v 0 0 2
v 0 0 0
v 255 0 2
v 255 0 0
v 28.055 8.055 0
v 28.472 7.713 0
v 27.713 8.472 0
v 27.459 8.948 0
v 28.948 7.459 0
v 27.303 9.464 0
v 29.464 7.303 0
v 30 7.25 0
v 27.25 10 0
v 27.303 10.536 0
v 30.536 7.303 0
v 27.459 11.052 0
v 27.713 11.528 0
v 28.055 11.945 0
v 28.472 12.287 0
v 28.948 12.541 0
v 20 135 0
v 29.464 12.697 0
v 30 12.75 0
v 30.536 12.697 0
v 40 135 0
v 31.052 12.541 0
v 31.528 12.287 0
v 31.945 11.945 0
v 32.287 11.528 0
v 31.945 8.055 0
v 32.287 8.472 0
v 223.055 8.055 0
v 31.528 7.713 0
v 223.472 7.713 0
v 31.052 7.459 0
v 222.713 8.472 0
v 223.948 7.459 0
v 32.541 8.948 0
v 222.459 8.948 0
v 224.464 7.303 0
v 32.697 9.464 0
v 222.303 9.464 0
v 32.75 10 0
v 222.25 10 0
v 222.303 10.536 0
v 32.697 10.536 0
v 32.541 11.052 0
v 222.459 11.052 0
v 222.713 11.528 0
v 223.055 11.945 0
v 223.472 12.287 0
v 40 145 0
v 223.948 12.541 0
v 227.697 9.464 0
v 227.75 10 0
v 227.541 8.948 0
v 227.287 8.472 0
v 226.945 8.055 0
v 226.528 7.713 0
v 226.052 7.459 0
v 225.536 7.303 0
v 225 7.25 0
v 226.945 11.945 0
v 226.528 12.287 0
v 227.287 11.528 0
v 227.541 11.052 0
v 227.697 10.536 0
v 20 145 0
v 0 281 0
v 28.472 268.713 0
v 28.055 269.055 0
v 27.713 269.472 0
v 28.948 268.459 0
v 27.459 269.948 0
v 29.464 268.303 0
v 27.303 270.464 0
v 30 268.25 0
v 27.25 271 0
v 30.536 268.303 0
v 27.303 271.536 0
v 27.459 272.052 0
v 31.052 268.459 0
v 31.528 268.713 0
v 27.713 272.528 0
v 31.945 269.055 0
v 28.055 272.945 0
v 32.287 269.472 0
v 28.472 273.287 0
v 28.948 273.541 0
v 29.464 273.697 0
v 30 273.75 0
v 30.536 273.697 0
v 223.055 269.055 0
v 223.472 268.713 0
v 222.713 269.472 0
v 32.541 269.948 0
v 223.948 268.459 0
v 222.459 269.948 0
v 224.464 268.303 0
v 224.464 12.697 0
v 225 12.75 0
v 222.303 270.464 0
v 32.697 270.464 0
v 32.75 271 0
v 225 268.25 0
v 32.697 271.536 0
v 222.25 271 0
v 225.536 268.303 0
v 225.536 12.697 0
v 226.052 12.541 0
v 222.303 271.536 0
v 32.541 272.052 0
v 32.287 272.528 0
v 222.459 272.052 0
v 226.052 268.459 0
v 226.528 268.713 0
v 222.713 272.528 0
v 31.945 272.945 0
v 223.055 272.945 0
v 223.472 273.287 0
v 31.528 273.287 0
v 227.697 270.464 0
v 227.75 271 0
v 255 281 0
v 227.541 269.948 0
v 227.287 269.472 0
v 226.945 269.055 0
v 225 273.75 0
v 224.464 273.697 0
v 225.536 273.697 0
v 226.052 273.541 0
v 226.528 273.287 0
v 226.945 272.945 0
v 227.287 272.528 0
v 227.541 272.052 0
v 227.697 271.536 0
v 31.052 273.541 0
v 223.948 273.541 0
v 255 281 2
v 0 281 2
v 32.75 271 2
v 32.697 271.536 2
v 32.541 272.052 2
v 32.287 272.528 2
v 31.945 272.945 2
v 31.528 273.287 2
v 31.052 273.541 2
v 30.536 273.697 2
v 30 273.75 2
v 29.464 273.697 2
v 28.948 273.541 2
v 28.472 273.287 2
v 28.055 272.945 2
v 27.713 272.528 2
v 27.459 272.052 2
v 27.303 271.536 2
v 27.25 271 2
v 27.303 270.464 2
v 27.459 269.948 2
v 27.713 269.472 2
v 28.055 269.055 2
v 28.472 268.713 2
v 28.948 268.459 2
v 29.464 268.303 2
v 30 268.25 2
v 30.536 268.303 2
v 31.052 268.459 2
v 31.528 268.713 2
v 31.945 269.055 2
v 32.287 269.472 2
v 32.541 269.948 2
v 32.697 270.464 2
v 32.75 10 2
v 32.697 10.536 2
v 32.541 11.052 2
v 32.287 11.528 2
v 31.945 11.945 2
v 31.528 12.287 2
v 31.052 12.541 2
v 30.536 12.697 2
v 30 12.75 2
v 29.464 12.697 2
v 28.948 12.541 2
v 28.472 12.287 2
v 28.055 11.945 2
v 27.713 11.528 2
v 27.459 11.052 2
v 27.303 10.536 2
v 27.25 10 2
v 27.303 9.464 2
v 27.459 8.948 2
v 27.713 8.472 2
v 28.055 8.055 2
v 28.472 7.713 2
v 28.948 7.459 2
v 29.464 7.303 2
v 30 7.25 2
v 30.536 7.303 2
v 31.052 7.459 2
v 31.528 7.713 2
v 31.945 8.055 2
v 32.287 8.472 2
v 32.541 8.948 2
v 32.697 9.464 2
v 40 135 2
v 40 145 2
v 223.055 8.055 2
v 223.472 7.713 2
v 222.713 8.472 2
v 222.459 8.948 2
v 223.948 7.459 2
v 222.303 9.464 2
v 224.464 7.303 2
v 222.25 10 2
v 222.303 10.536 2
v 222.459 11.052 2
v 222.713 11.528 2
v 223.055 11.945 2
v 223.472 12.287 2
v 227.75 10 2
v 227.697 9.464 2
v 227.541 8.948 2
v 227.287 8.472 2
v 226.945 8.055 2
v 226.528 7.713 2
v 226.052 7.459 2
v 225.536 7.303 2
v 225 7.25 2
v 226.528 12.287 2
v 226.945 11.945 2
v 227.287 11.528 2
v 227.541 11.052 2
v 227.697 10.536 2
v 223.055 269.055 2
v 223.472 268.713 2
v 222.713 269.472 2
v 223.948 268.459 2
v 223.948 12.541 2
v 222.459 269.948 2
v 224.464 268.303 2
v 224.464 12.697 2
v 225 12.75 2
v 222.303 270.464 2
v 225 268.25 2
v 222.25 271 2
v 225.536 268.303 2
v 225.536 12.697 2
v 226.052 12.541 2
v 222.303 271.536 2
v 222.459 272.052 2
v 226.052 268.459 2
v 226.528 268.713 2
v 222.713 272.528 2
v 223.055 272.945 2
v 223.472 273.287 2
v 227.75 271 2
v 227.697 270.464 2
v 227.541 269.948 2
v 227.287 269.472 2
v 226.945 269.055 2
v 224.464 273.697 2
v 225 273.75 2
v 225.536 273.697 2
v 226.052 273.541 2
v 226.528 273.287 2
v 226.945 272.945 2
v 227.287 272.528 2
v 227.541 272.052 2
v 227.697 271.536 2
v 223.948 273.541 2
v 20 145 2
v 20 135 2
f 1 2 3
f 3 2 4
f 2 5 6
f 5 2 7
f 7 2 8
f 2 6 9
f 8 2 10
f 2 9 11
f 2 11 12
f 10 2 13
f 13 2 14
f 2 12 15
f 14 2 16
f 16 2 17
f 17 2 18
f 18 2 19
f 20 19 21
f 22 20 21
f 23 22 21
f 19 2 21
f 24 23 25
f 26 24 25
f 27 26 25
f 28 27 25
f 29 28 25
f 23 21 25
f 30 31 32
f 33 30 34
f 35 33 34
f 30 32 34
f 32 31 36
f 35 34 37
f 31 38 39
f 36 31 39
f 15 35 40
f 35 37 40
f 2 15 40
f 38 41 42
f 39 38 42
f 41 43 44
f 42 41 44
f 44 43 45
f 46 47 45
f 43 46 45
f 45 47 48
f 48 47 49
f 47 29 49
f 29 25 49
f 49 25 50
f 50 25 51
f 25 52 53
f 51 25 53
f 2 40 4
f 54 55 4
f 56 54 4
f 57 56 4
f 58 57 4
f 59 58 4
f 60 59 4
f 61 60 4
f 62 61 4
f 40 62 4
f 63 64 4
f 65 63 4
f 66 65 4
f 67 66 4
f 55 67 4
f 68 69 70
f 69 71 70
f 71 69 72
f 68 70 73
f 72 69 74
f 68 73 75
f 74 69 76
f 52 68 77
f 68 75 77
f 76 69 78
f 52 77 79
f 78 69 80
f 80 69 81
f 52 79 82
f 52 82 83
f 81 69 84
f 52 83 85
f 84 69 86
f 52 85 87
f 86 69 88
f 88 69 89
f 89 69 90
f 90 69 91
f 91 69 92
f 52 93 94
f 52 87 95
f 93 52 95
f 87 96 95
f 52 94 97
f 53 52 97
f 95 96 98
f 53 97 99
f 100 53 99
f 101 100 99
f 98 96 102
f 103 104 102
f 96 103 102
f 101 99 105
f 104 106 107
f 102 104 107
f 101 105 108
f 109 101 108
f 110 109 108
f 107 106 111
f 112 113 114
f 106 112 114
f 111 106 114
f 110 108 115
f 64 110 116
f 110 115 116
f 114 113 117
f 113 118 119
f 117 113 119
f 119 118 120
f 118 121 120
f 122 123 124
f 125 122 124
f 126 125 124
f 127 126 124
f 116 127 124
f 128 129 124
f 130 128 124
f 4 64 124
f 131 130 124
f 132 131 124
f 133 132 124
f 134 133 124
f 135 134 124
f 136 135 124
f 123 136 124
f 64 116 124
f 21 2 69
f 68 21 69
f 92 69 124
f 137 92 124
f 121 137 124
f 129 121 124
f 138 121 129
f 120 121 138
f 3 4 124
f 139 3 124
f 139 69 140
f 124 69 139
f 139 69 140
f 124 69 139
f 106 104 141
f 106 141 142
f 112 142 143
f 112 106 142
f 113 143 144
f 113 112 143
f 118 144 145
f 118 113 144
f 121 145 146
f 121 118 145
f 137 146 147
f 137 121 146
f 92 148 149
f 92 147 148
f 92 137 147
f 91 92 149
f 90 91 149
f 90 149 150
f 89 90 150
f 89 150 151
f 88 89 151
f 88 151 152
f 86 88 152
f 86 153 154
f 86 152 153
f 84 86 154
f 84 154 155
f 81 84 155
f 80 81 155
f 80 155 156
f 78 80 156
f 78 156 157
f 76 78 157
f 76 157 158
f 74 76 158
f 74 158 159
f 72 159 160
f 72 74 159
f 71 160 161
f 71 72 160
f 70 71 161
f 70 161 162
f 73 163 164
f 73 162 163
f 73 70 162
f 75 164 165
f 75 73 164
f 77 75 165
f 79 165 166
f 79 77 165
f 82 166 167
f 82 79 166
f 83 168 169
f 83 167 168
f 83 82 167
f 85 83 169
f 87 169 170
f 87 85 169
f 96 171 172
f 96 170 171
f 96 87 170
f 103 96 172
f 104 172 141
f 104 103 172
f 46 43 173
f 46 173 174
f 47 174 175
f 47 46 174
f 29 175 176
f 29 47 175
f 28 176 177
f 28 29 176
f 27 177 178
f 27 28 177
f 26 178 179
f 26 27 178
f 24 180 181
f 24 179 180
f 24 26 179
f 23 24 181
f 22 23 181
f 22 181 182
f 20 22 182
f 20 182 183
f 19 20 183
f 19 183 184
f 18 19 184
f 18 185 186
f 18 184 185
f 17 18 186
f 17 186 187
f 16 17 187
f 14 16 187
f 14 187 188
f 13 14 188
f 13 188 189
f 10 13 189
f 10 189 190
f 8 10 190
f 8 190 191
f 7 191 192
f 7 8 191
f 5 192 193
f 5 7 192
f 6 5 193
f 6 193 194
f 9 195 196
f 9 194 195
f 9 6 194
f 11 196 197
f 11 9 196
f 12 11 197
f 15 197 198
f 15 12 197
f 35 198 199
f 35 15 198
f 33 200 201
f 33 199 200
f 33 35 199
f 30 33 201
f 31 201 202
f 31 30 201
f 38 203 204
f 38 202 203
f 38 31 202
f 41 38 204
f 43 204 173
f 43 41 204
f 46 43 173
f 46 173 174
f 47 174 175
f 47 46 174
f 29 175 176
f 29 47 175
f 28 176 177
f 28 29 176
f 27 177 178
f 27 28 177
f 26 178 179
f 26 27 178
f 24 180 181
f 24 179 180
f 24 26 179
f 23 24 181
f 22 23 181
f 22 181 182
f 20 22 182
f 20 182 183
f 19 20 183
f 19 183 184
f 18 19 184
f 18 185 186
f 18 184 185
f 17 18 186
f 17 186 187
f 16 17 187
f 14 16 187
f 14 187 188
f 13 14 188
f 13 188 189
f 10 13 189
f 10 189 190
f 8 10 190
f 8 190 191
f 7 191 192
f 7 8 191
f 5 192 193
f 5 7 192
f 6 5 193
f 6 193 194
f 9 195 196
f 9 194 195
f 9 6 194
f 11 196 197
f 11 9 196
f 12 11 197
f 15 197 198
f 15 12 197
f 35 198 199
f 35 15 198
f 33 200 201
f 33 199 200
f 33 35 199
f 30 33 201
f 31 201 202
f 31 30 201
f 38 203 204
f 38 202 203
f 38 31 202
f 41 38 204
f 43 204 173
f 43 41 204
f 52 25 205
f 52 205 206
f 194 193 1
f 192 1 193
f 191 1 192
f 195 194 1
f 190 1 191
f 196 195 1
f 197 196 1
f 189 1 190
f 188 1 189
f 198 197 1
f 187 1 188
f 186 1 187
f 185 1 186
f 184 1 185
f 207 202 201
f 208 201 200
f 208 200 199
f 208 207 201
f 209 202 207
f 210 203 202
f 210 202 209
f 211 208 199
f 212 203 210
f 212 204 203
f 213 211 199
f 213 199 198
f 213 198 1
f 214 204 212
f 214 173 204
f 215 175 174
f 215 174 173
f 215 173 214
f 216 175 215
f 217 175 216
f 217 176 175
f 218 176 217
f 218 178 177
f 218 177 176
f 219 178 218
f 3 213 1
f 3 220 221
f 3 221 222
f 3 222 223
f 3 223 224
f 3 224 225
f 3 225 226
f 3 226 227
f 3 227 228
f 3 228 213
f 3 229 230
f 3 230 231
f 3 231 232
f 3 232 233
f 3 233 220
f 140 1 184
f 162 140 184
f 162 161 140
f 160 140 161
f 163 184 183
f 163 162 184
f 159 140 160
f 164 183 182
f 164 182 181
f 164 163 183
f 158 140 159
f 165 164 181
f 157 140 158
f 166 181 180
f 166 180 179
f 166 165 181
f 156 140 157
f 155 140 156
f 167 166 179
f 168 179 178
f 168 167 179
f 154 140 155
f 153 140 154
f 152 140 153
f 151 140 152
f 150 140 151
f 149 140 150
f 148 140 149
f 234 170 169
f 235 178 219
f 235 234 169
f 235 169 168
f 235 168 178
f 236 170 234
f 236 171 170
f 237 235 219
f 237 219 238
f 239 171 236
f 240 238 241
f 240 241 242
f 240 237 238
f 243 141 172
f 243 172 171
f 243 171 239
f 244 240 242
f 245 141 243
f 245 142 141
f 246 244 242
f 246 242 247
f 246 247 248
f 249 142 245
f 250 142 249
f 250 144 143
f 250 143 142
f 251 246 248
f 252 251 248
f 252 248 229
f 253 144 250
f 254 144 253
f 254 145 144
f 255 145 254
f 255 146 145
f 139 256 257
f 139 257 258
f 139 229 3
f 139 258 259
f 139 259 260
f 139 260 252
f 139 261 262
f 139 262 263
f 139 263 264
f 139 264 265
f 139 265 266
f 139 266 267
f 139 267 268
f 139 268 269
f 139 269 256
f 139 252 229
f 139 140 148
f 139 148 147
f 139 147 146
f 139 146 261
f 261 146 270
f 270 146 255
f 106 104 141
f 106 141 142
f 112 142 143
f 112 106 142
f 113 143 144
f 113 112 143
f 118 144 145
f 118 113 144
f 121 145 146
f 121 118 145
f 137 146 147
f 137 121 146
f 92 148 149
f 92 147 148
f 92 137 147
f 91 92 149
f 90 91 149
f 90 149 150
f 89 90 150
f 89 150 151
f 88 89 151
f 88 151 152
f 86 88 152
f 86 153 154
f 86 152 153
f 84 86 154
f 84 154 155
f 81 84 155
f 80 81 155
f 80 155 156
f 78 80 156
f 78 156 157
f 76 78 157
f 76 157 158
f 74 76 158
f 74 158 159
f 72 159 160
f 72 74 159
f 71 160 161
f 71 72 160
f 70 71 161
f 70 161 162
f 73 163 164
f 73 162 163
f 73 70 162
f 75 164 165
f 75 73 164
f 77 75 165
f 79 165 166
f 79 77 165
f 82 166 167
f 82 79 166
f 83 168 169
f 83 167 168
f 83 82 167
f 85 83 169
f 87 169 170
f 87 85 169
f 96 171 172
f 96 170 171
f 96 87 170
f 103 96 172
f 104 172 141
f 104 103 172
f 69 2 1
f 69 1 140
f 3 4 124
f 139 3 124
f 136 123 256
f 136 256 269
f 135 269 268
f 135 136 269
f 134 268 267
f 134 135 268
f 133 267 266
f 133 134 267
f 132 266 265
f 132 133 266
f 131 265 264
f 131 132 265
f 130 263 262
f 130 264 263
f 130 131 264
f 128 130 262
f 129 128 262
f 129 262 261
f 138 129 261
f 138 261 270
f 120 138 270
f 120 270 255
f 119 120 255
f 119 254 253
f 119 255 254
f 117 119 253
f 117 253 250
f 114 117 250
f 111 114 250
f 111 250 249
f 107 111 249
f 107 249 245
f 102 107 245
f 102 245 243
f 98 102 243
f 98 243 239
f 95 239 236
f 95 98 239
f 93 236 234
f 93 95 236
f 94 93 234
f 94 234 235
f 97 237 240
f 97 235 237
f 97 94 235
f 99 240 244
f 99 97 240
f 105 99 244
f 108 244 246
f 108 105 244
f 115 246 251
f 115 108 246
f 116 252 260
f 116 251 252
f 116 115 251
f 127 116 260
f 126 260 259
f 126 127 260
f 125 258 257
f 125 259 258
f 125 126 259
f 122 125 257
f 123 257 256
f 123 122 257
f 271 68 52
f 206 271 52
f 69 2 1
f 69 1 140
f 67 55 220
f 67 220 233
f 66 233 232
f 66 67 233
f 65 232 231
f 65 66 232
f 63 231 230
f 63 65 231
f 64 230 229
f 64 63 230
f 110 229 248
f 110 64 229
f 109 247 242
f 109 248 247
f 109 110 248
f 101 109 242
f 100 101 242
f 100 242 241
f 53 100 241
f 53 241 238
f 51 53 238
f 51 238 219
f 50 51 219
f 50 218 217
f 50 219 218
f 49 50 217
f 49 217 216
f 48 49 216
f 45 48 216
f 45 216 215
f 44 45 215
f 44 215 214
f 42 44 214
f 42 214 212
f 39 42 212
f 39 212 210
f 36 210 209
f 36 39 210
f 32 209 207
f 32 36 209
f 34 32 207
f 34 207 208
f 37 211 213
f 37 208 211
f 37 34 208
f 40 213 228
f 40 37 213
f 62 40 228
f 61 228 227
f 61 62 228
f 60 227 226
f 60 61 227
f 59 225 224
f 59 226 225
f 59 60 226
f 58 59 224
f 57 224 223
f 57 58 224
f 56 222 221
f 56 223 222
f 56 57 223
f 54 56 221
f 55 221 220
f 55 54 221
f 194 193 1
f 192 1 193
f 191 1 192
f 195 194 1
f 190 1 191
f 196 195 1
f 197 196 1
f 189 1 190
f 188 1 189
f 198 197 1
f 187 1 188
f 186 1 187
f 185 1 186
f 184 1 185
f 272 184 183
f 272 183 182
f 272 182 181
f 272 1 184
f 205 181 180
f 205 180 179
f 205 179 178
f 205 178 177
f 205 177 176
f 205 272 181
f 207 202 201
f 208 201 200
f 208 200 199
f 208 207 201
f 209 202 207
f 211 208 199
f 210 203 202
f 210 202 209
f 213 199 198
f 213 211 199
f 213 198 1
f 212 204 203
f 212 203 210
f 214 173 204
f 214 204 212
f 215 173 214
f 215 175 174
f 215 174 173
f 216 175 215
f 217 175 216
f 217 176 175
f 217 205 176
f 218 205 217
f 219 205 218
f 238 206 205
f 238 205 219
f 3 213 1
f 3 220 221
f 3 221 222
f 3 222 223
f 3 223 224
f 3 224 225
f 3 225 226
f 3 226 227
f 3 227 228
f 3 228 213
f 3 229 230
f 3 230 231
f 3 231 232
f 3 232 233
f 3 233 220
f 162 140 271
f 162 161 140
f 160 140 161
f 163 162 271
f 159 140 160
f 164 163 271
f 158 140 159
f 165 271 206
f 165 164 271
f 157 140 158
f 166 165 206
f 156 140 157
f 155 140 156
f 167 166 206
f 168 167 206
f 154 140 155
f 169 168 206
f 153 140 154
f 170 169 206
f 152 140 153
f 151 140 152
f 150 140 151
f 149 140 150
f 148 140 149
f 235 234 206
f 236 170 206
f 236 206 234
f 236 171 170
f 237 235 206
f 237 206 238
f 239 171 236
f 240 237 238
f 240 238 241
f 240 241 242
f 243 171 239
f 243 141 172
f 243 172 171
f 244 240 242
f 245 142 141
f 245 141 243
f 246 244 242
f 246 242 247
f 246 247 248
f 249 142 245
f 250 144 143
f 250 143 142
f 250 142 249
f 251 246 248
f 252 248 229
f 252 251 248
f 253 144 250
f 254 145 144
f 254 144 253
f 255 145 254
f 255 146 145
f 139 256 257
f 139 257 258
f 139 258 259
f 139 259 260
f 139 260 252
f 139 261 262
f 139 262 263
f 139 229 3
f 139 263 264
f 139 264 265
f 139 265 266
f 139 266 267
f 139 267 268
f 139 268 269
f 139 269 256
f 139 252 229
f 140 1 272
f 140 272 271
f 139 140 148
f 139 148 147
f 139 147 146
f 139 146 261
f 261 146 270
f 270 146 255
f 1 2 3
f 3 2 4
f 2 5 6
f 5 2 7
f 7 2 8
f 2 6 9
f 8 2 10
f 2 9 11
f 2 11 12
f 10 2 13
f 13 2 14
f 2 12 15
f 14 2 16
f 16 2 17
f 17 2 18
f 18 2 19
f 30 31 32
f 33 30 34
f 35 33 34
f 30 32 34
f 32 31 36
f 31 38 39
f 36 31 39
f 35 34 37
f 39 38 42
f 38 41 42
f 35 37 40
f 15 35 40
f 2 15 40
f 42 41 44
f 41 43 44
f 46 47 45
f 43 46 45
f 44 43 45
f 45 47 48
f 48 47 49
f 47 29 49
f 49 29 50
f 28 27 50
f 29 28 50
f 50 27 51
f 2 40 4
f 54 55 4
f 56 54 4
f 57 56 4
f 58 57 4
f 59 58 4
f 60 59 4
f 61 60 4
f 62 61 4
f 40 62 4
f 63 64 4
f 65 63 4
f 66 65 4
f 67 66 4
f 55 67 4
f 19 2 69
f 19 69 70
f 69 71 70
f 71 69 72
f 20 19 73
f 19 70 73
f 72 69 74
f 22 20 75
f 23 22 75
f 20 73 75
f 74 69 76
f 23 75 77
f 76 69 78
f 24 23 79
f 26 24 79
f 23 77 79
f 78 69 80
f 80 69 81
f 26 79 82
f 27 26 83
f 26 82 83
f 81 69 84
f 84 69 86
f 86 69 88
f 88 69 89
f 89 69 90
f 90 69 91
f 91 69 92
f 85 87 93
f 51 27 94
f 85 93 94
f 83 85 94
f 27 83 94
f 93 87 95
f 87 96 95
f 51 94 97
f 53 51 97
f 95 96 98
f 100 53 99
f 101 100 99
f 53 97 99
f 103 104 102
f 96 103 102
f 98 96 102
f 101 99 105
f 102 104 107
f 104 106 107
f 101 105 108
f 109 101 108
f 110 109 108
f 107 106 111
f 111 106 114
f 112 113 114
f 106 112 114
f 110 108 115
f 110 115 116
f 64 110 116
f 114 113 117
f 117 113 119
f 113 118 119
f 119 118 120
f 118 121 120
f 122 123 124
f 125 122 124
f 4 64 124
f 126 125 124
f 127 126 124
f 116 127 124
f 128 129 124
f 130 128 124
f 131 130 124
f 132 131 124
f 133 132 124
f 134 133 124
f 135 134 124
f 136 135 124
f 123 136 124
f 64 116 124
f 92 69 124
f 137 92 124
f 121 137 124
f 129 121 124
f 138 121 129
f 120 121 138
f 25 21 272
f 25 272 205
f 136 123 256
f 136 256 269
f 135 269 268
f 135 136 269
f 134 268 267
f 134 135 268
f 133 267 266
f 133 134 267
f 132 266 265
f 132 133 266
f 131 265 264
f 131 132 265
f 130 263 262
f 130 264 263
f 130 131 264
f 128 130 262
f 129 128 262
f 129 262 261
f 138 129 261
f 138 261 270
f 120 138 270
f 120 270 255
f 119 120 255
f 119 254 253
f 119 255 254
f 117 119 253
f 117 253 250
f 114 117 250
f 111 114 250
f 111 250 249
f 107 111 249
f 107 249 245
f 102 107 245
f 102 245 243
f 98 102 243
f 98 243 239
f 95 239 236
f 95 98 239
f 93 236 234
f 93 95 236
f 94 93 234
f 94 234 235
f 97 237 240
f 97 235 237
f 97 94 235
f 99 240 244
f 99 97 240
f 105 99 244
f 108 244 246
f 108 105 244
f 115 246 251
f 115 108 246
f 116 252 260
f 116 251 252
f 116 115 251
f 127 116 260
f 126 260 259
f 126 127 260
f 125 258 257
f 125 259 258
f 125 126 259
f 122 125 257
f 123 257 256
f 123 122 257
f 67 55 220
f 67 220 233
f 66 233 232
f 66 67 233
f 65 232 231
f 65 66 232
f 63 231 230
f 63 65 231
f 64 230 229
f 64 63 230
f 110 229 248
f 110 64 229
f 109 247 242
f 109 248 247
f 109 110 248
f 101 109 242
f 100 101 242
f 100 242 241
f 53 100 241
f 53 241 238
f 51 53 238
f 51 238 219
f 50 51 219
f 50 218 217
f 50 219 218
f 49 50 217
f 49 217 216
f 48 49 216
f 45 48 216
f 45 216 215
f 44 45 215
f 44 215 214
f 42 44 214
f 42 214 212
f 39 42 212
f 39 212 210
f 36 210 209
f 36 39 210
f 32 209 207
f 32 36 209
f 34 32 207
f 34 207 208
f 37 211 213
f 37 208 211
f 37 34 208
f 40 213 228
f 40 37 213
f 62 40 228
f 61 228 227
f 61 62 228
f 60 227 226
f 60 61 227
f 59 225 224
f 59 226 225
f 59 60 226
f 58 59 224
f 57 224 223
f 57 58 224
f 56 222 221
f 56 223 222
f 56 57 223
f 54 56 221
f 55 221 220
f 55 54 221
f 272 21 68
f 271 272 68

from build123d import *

# Parameters (mm, degrees)
CYLINDER003_R     = 2.75
CYLINDER003_DEPTH = 10
CYLINDER002_R     = 2.75
CYLINDER002_DEPTH = 10
CYLINDER001_R     = 2.75
CYLINDER001_DEPTH = 10
CYLINDER_R        = 2.75
CYLINDER_DEPTH    = 10
BOX_W             = 255
BOX_H             = 281
BOX_DEPTH         = 2
BOX001_W          = 20
BOX001_H          = 10
BOX001_DEPTH      = 10


with BuildPart() as cylinder003:
    # Cylinder003 → Cylinder003 (new body)
    with BuildSketch(Plane(origin=(225, 271, -5), x_dir=(1, 0, 0), z_dir=(0, 0, 1))):
        Circle(CYLINDER003_R)
    extrude(amount=CYLINDER003_DEPTH)


with BuildPart() as cylinder002:
    # Cylinder002 → Cylinder002 (new body)
    with BuildSketch(Plane(origin=(225, 10, -5), x_dir=(1, 0, 0), z_dir=(0, 0, 1))):
        Circle(CYLINDER002_R)
    extrude(amount=CYLINDER002_DEPTH)


with BuildPart() as cylinder001:
    # Cylinder001 → Cylinder001 (new body)
    with BuildSketch(Plane(origin=(30, 271, -5), x_dir=(1, 0, 0), z_dir=(0, 0, 1))):
        Circle(CYLINDER001_R)
    extrude(amount=CYLINDER001_DEPTH)


with BuildPart() as cylinder:
    # Cylinder → Cylinder (new body)
    with BuildSketch(Plane(origin=(30, 10, -5), x_dir=(1, 0, 0), z_dir=(0, 0, 1))):
        Circle(CYLINDER_R)
    extrude(amount=CYLINDER_DEPTH)


with BuildPart() as cut002:
    # Box → Box (new body)
    with BuildSketch(Plane.XY.offset(0)):
        with Locations((127.5, 140.5)):
            Rectangle(BOX_W, BOX_H)
    extrude(amount=BOX_DEPTH)

    # Cut: cut Cylinder
    add(cylinder.part, mode=Mode.SUBTRACT)

    # Cut001: cut Cylinder001
    add(cylinder001.part, mode=Mode.SUBTRACT)

    # Cut002: cut Cylinder002
    add(cylinder002.part, mode=Mode.SUBTRACT)


with BuildPart() as cut004:
    # Cut004 base: copy of Cut002
    add(cut002.part)

    # Cut004: cut Cylinder003
    add(cylinder003.part, mode=Mode.SUBTRACT)


with BuildPart() as cube001:
    # Box001 → Box001 (new body)
    with BuildSketch(Plane(origin=(20, 135, -5), x_dir=(1, 0, 0), z_dir=(0, 0, 1))):
        with Locations((10, 5)):
            Rectangle(BOX001_W, BOX001_H)
    extrude(amount=BOX001_DEPTH)


with BuildPart() as cut005:
    # Cut003 base: copy of Cut002
    add(cut002.part)

    # Cut003: cut Cylinder003
    add(cylinder003.part, mode=Mode.SUBTRACT)

    # Cut005: cut Cube001
    add(cube001.part, mode=Mode.SUBTRACT)


solid = Compound([cut004.part, cut005.part])
